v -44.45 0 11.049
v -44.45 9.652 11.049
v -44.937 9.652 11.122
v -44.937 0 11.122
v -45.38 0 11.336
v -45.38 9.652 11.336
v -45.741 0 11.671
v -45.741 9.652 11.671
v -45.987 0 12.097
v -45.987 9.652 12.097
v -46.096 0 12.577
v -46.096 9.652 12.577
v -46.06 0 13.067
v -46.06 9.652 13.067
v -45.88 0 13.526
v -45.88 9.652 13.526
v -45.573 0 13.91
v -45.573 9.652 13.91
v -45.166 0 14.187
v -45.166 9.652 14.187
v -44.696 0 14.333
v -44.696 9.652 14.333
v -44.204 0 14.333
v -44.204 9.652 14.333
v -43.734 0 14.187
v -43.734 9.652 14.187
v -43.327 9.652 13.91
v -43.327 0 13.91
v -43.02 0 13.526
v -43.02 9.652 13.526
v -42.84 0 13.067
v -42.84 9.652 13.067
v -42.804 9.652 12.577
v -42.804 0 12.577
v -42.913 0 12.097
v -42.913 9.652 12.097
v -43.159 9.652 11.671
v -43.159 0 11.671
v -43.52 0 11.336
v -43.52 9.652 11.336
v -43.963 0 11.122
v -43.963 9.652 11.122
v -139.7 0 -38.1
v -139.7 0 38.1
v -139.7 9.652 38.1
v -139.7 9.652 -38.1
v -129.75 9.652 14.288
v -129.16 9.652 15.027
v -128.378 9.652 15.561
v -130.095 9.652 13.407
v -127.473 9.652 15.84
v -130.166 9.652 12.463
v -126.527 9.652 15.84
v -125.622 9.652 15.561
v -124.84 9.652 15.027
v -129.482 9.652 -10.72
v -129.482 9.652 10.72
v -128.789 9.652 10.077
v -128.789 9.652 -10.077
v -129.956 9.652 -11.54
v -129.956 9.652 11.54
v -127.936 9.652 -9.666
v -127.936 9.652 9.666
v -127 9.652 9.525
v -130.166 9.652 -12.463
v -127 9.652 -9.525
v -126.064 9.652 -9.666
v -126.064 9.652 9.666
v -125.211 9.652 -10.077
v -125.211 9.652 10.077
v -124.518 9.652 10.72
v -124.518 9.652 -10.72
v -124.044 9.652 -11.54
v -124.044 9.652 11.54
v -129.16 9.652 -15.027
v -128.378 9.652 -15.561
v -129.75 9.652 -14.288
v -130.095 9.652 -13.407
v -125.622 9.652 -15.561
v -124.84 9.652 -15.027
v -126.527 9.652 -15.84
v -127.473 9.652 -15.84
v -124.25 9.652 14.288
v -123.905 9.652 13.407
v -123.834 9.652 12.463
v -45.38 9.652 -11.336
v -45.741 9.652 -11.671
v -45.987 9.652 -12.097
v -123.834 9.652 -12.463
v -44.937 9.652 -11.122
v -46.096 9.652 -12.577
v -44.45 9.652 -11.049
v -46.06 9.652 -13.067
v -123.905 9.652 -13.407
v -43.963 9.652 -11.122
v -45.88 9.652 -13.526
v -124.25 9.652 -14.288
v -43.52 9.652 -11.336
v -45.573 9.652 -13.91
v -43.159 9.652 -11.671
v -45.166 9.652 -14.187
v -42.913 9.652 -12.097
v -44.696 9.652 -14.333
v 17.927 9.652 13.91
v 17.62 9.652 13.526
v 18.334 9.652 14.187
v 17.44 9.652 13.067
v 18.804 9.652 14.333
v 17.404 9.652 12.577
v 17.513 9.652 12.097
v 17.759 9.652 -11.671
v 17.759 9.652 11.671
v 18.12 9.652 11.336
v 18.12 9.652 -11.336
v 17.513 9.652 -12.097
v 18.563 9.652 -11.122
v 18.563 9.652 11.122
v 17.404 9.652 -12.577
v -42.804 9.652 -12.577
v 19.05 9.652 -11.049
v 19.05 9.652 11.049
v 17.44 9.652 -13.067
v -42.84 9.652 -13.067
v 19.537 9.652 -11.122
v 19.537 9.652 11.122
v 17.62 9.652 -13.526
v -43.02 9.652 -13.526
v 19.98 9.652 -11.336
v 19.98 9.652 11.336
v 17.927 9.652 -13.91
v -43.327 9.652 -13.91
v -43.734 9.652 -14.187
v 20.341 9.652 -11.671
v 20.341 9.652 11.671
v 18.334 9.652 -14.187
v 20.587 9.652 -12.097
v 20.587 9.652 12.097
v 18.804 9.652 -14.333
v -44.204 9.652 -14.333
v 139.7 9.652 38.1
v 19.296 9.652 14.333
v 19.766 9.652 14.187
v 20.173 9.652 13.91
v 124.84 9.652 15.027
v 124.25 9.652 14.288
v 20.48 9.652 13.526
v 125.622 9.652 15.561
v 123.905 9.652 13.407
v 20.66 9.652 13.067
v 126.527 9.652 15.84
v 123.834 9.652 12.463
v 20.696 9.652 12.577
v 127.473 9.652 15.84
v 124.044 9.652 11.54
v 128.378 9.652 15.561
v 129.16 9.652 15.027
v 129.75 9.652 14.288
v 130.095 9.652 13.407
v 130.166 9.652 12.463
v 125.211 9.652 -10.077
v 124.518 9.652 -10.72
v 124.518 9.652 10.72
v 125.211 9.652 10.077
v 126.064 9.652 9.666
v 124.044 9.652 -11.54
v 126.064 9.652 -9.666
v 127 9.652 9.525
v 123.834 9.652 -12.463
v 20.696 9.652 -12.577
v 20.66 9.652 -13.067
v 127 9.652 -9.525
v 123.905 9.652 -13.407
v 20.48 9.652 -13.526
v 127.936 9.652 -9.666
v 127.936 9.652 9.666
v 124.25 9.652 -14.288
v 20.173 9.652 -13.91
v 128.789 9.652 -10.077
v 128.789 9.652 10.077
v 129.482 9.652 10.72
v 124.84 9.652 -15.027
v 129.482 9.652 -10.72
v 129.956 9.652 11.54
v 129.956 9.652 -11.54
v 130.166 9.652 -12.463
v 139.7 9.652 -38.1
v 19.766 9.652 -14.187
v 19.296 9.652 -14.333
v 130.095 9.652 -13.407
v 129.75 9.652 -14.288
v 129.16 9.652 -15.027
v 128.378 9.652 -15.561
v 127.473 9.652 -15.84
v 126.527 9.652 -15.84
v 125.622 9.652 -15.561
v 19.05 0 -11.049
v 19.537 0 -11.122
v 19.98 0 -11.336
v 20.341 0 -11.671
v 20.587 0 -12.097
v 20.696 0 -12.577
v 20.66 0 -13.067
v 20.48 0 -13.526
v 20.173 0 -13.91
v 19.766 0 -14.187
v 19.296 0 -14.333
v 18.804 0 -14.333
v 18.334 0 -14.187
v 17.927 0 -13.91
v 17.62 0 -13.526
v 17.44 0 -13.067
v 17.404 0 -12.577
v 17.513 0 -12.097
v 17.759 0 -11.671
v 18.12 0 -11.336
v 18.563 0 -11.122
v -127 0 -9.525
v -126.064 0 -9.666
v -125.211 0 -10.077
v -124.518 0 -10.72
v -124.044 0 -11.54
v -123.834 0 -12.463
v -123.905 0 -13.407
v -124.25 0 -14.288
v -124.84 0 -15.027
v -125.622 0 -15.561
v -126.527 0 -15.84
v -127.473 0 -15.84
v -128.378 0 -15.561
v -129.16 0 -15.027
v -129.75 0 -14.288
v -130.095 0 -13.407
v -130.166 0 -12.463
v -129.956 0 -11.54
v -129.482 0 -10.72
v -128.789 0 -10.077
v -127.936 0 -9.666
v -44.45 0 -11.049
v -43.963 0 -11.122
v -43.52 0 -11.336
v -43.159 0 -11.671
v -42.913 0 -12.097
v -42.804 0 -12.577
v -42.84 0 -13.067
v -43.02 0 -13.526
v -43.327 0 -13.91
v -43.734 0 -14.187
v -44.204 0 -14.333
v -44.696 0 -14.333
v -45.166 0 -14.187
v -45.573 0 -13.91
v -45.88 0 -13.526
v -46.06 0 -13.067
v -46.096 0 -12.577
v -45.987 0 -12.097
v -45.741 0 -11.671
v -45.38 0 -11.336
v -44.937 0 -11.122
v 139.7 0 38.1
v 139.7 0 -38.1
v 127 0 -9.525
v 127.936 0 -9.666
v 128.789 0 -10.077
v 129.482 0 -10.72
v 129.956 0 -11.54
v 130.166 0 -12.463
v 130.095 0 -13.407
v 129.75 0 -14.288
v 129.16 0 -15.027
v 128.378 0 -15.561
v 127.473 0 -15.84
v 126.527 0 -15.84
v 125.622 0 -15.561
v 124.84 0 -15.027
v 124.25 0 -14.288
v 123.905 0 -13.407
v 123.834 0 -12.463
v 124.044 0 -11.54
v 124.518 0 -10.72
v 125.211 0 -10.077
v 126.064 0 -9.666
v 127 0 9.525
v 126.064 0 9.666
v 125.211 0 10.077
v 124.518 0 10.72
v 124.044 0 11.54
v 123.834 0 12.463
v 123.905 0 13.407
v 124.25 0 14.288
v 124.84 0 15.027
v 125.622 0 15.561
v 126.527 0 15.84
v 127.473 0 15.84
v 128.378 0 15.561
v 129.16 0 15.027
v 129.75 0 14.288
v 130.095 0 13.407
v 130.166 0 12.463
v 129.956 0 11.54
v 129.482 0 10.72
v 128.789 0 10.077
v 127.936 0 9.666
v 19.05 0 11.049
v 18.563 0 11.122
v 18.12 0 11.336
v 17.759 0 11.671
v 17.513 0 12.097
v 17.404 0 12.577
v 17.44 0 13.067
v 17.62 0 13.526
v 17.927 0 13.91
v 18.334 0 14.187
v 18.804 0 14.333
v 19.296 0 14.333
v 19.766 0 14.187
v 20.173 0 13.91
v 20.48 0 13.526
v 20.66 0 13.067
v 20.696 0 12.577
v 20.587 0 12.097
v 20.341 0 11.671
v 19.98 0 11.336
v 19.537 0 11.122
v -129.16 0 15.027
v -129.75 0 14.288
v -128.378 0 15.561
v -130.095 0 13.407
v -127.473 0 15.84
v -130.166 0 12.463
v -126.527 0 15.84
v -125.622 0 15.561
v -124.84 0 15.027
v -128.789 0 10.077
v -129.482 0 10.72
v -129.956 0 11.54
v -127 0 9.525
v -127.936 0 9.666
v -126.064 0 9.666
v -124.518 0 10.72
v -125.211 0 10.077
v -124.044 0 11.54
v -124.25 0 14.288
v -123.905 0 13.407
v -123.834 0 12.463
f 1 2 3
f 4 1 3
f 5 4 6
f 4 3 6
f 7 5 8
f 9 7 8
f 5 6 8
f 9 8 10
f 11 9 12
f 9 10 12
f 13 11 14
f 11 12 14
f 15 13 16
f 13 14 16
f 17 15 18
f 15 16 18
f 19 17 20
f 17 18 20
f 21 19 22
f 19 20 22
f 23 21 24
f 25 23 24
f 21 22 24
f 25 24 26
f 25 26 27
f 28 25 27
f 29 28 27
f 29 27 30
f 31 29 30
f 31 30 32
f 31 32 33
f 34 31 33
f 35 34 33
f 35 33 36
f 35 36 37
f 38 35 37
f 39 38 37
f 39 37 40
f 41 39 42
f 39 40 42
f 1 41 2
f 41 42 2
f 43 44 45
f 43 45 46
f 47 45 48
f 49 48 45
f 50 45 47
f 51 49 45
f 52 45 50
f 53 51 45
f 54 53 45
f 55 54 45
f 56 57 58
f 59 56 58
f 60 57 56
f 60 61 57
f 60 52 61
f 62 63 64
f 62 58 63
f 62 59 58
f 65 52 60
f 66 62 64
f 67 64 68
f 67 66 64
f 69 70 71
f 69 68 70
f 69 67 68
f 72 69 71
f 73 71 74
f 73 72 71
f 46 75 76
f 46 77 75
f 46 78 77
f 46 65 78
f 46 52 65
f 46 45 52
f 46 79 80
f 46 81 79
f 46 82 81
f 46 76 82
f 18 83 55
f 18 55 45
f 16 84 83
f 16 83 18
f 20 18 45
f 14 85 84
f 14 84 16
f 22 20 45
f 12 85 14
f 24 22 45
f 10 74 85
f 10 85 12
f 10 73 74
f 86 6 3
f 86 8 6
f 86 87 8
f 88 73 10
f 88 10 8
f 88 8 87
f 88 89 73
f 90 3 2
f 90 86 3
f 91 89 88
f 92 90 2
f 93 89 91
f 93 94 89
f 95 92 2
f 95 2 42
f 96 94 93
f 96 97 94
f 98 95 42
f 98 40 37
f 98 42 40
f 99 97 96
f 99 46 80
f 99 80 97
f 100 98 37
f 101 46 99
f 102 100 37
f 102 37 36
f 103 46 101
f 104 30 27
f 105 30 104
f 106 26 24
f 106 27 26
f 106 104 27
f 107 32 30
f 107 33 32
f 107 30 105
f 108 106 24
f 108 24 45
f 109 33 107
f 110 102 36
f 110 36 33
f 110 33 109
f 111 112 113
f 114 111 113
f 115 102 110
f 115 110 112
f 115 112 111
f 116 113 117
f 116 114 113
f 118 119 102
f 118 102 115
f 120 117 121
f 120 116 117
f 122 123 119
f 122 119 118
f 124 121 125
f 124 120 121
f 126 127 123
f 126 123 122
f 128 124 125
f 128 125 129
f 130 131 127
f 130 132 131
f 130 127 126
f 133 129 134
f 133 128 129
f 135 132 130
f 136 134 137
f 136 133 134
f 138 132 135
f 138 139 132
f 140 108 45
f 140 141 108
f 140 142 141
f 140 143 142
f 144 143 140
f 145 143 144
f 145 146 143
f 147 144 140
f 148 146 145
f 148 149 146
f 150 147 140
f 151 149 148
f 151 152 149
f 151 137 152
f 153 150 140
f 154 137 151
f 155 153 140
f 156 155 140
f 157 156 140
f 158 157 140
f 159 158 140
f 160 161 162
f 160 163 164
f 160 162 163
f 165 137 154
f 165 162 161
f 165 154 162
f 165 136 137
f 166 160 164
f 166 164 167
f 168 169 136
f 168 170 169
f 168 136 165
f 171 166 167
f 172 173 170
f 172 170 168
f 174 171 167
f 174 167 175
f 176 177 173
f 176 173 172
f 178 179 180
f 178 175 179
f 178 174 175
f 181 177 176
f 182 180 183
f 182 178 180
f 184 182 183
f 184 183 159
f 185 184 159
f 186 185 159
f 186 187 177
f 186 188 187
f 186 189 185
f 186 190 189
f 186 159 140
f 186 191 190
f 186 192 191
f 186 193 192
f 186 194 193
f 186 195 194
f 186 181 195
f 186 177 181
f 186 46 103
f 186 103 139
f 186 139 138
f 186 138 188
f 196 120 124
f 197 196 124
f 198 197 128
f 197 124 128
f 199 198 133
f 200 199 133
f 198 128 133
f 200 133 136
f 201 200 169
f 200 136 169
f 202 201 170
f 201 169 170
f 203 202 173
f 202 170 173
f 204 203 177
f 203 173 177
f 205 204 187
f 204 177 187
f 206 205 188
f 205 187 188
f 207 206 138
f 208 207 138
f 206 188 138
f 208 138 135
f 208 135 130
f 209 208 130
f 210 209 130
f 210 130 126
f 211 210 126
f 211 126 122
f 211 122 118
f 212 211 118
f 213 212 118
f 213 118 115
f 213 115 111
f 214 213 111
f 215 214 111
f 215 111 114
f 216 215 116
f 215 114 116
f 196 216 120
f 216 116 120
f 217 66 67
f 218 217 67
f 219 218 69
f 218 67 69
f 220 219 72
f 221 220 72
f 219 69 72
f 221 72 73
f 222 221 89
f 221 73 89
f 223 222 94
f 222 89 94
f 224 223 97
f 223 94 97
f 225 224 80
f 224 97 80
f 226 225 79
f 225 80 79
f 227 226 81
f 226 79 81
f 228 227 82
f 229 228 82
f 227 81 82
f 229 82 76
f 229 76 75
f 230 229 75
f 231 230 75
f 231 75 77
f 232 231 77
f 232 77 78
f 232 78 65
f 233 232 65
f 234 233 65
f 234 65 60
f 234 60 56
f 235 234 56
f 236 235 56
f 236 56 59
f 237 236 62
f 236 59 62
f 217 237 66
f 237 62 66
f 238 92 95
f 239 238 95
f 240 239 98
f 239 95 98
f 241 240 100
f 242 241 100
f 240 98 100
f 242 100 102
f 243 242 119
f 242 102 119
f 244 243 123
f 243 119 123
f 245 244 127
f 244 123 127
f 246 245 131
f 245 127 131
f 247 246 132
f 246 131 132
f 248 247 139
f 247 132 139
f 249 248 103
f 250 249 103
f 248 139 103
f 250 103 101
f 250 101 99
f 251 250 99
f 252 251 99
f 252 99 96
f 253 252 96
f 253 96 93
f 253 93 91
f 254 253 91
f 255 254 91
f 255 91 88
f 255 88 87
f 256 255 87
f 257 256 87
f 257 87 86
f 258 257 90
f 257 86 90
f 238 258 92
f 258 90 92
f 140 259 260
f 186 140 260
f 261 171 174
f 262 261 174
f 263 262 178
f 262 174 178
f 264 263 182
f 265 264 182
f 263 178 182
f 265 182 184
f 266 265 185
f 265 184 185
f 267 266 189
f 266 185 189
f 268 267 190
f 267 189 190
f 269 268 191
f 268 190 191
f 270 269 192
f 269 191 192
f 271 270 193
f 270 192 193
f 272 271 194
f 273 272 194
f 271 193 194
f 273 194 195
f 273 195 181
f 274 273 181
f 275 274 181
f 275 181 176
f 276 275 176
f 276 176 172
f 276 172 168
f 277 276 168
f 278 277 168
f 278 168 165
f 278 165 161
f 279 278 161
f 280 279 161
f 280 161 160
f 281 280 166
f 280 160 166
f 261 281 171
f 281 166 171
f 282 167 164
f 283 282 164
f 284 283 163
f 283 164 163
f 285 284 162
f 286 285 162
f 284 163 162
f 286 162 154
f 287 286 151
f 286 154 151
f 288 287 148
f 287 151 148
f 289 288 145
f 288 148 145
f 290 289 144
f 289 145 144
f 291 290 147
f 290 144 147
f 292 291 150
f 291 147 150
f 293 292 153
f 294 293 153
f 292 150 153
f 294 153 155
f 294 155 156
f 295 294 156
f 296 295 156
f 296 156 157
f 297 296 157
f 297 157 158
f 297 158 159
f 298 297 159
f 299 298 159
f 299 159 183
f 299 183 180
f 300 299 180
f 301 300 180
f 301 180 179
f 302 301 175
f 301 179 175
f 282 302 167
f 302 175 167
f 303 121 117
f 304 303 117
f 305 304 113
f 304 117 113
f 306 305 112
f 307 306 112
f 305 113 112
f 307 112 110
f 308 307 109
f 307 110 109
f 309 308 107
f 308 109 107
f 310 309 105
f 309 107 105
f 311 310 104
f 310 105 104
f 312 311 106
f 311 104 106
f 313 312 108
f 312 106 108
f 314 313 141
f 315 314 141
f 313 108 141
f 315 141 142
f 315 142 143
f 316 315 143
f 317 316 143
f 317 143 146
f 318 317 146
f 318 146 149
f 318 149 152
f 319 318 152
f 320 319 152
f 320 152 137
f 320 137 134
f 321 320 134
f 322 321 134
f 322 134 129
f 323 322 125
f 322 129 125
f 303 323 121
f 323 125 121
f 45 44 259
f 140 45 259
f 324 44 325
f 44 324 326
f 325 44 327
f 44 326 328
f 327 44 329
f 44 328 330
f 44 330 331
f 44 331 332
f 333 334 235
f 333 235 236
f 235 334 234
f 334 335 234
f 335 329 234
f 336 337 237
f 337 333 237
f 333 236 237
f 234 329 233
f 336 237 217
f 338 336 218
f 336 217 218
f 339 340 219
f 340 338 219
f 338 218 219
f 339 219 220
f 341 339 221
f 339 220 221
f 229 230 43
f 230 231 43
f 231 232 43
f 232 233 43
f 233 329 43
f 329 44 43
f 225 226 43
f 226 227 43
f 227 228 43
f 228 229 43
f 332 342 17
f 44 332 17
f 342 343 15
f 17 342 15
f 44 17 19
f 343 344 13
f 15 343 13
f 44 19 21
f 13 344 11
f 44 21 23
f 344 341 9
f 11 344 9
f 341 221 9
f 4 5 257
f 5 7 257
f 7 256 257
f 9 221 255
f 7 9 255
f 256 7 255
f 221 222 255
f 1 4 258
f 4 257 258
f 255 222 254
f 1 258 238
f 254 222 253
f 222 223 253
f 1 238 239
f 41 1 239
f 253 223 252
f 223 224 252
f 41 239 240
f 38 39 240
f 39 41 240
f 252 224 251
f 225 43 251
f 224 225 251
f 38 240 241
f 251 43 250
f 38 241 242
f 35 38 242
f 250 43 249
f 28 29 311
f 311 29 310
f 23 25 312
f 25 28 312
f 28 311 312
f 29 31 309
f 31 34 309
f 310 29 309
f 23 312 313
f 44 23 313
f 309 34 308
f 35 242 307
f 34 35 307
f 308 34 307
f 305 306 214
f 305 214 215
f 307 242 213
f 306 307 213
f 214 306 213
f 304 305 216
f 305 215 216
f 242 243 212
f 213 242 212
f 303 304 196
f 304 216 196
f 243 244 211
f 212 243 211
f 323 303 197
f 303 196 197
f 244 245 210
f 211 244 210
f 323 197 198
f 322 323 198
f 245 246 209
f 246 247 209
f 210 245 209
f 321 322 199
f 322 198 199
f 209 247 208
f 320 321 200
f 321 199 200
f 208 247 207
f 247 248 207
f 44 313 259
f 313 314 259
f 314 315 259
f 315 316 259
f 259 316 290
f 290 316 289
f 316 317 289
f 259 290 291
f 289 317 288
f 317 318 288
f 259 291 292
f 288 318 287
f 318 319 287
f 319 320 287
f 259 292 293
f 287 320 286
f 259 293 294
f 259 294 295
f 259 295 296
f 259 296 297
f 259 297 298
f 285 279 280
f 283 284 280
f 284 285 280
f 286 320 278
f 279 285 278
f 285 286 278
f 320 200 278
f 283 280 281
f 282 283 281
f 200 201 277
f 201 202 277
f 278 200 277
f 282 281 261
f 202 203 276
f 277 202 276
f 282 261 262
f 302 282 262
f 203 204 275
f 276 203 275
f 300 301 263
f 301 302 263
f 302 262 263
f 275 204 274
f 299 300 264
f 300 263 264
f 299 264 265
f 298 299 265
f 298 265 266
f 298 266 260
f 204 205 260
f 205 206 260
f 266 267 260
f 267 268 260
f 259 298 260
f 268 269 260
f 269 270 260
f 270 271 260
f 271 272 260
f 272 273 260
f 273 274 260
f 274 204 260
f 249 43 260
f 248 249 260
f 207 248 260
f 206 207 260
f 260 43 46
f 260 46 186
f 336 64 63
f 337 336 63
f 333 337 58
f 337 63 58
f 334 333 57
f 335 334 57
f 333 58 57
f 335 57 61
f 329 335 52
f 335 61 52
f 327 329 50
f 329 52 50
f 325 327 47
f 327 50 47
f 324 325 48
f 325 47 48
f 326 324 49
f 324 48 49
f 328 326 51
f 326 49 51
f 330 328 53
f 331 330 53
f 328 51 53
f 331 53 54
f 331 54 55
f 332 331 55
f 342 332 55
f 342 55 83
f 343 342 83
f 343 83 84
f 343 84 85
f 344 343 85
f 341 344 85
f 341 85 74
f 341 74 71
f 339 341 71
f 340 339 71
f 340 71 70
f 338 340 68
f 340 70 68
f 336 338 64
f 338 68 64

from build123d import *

# Parameters (mm, degrees)
SKETCH1_W           = 279.4
SKETCH1_H           = 76.2
BOSS_EXTRUDE1_DEPTH = 9.652
SKETCH2_R           = 3.175
SKETCH2_R_2         = 1.651
CUT_EXTRUDE1_DEPTH  = 9.652


with BuildPart() as part:
    # Sketch1 → Boss-Extrude1 (new body)
    with BuildSketch(Plane(origin=(0, 0, 0), x_dir=(1, 0, 0), z_dir=(0, 1, 0))):
        Rectangle(SKETCH1_W, SKETCH1_H)
    extrude(amount=BOSS_EXTRUDE1_DEPTH)

    # Sketch2 → Cut-Extrude1 (cut)
    with BuildSketch(Plane(origin=(0, 9.652, 0), x_dir=(1, 0, 0), z_dir=(0, 1, 0))):
        with Locations(Location((-127, 12.7, 0), (0, 0, 270))):
            Circle(SKETCH2_R)
        with Locations(Location((-44.45, 12.7, 0), (0, 0, 270))):
            Circle(SKETCH2_R_2)
        with Locations(Location((19.05, 12.7, 0), (0, 0, 270))):
            Circle(SKETCH2_R_2)
        with Locations(Location((127, 12.7, 0), (0, 0, 270))):
            Circle(SKETCH2_R)
        with Locations(Location((127, -12.7, 0), (0, 0, 90))):
            Circle(SKETCH2_R)
        with Locations(Location((19.05, -12.7, 0), (0, 0, 90))):
            Circle(SKETCH2_R_2)
        with Locations(Location((-44.45, -12.7, 0), (0, 0, 90))):
            Circle(SKETCH2_R_2)
        with Locations(Location((-127, -12.7, 0), (0, 0, 90))):
            Circle(SKETCH2_R)
    extrude(amount=-CUT_EXTRUDE1_DEPTH, mode=Mode.SUBTRACT)


solid = part.part
